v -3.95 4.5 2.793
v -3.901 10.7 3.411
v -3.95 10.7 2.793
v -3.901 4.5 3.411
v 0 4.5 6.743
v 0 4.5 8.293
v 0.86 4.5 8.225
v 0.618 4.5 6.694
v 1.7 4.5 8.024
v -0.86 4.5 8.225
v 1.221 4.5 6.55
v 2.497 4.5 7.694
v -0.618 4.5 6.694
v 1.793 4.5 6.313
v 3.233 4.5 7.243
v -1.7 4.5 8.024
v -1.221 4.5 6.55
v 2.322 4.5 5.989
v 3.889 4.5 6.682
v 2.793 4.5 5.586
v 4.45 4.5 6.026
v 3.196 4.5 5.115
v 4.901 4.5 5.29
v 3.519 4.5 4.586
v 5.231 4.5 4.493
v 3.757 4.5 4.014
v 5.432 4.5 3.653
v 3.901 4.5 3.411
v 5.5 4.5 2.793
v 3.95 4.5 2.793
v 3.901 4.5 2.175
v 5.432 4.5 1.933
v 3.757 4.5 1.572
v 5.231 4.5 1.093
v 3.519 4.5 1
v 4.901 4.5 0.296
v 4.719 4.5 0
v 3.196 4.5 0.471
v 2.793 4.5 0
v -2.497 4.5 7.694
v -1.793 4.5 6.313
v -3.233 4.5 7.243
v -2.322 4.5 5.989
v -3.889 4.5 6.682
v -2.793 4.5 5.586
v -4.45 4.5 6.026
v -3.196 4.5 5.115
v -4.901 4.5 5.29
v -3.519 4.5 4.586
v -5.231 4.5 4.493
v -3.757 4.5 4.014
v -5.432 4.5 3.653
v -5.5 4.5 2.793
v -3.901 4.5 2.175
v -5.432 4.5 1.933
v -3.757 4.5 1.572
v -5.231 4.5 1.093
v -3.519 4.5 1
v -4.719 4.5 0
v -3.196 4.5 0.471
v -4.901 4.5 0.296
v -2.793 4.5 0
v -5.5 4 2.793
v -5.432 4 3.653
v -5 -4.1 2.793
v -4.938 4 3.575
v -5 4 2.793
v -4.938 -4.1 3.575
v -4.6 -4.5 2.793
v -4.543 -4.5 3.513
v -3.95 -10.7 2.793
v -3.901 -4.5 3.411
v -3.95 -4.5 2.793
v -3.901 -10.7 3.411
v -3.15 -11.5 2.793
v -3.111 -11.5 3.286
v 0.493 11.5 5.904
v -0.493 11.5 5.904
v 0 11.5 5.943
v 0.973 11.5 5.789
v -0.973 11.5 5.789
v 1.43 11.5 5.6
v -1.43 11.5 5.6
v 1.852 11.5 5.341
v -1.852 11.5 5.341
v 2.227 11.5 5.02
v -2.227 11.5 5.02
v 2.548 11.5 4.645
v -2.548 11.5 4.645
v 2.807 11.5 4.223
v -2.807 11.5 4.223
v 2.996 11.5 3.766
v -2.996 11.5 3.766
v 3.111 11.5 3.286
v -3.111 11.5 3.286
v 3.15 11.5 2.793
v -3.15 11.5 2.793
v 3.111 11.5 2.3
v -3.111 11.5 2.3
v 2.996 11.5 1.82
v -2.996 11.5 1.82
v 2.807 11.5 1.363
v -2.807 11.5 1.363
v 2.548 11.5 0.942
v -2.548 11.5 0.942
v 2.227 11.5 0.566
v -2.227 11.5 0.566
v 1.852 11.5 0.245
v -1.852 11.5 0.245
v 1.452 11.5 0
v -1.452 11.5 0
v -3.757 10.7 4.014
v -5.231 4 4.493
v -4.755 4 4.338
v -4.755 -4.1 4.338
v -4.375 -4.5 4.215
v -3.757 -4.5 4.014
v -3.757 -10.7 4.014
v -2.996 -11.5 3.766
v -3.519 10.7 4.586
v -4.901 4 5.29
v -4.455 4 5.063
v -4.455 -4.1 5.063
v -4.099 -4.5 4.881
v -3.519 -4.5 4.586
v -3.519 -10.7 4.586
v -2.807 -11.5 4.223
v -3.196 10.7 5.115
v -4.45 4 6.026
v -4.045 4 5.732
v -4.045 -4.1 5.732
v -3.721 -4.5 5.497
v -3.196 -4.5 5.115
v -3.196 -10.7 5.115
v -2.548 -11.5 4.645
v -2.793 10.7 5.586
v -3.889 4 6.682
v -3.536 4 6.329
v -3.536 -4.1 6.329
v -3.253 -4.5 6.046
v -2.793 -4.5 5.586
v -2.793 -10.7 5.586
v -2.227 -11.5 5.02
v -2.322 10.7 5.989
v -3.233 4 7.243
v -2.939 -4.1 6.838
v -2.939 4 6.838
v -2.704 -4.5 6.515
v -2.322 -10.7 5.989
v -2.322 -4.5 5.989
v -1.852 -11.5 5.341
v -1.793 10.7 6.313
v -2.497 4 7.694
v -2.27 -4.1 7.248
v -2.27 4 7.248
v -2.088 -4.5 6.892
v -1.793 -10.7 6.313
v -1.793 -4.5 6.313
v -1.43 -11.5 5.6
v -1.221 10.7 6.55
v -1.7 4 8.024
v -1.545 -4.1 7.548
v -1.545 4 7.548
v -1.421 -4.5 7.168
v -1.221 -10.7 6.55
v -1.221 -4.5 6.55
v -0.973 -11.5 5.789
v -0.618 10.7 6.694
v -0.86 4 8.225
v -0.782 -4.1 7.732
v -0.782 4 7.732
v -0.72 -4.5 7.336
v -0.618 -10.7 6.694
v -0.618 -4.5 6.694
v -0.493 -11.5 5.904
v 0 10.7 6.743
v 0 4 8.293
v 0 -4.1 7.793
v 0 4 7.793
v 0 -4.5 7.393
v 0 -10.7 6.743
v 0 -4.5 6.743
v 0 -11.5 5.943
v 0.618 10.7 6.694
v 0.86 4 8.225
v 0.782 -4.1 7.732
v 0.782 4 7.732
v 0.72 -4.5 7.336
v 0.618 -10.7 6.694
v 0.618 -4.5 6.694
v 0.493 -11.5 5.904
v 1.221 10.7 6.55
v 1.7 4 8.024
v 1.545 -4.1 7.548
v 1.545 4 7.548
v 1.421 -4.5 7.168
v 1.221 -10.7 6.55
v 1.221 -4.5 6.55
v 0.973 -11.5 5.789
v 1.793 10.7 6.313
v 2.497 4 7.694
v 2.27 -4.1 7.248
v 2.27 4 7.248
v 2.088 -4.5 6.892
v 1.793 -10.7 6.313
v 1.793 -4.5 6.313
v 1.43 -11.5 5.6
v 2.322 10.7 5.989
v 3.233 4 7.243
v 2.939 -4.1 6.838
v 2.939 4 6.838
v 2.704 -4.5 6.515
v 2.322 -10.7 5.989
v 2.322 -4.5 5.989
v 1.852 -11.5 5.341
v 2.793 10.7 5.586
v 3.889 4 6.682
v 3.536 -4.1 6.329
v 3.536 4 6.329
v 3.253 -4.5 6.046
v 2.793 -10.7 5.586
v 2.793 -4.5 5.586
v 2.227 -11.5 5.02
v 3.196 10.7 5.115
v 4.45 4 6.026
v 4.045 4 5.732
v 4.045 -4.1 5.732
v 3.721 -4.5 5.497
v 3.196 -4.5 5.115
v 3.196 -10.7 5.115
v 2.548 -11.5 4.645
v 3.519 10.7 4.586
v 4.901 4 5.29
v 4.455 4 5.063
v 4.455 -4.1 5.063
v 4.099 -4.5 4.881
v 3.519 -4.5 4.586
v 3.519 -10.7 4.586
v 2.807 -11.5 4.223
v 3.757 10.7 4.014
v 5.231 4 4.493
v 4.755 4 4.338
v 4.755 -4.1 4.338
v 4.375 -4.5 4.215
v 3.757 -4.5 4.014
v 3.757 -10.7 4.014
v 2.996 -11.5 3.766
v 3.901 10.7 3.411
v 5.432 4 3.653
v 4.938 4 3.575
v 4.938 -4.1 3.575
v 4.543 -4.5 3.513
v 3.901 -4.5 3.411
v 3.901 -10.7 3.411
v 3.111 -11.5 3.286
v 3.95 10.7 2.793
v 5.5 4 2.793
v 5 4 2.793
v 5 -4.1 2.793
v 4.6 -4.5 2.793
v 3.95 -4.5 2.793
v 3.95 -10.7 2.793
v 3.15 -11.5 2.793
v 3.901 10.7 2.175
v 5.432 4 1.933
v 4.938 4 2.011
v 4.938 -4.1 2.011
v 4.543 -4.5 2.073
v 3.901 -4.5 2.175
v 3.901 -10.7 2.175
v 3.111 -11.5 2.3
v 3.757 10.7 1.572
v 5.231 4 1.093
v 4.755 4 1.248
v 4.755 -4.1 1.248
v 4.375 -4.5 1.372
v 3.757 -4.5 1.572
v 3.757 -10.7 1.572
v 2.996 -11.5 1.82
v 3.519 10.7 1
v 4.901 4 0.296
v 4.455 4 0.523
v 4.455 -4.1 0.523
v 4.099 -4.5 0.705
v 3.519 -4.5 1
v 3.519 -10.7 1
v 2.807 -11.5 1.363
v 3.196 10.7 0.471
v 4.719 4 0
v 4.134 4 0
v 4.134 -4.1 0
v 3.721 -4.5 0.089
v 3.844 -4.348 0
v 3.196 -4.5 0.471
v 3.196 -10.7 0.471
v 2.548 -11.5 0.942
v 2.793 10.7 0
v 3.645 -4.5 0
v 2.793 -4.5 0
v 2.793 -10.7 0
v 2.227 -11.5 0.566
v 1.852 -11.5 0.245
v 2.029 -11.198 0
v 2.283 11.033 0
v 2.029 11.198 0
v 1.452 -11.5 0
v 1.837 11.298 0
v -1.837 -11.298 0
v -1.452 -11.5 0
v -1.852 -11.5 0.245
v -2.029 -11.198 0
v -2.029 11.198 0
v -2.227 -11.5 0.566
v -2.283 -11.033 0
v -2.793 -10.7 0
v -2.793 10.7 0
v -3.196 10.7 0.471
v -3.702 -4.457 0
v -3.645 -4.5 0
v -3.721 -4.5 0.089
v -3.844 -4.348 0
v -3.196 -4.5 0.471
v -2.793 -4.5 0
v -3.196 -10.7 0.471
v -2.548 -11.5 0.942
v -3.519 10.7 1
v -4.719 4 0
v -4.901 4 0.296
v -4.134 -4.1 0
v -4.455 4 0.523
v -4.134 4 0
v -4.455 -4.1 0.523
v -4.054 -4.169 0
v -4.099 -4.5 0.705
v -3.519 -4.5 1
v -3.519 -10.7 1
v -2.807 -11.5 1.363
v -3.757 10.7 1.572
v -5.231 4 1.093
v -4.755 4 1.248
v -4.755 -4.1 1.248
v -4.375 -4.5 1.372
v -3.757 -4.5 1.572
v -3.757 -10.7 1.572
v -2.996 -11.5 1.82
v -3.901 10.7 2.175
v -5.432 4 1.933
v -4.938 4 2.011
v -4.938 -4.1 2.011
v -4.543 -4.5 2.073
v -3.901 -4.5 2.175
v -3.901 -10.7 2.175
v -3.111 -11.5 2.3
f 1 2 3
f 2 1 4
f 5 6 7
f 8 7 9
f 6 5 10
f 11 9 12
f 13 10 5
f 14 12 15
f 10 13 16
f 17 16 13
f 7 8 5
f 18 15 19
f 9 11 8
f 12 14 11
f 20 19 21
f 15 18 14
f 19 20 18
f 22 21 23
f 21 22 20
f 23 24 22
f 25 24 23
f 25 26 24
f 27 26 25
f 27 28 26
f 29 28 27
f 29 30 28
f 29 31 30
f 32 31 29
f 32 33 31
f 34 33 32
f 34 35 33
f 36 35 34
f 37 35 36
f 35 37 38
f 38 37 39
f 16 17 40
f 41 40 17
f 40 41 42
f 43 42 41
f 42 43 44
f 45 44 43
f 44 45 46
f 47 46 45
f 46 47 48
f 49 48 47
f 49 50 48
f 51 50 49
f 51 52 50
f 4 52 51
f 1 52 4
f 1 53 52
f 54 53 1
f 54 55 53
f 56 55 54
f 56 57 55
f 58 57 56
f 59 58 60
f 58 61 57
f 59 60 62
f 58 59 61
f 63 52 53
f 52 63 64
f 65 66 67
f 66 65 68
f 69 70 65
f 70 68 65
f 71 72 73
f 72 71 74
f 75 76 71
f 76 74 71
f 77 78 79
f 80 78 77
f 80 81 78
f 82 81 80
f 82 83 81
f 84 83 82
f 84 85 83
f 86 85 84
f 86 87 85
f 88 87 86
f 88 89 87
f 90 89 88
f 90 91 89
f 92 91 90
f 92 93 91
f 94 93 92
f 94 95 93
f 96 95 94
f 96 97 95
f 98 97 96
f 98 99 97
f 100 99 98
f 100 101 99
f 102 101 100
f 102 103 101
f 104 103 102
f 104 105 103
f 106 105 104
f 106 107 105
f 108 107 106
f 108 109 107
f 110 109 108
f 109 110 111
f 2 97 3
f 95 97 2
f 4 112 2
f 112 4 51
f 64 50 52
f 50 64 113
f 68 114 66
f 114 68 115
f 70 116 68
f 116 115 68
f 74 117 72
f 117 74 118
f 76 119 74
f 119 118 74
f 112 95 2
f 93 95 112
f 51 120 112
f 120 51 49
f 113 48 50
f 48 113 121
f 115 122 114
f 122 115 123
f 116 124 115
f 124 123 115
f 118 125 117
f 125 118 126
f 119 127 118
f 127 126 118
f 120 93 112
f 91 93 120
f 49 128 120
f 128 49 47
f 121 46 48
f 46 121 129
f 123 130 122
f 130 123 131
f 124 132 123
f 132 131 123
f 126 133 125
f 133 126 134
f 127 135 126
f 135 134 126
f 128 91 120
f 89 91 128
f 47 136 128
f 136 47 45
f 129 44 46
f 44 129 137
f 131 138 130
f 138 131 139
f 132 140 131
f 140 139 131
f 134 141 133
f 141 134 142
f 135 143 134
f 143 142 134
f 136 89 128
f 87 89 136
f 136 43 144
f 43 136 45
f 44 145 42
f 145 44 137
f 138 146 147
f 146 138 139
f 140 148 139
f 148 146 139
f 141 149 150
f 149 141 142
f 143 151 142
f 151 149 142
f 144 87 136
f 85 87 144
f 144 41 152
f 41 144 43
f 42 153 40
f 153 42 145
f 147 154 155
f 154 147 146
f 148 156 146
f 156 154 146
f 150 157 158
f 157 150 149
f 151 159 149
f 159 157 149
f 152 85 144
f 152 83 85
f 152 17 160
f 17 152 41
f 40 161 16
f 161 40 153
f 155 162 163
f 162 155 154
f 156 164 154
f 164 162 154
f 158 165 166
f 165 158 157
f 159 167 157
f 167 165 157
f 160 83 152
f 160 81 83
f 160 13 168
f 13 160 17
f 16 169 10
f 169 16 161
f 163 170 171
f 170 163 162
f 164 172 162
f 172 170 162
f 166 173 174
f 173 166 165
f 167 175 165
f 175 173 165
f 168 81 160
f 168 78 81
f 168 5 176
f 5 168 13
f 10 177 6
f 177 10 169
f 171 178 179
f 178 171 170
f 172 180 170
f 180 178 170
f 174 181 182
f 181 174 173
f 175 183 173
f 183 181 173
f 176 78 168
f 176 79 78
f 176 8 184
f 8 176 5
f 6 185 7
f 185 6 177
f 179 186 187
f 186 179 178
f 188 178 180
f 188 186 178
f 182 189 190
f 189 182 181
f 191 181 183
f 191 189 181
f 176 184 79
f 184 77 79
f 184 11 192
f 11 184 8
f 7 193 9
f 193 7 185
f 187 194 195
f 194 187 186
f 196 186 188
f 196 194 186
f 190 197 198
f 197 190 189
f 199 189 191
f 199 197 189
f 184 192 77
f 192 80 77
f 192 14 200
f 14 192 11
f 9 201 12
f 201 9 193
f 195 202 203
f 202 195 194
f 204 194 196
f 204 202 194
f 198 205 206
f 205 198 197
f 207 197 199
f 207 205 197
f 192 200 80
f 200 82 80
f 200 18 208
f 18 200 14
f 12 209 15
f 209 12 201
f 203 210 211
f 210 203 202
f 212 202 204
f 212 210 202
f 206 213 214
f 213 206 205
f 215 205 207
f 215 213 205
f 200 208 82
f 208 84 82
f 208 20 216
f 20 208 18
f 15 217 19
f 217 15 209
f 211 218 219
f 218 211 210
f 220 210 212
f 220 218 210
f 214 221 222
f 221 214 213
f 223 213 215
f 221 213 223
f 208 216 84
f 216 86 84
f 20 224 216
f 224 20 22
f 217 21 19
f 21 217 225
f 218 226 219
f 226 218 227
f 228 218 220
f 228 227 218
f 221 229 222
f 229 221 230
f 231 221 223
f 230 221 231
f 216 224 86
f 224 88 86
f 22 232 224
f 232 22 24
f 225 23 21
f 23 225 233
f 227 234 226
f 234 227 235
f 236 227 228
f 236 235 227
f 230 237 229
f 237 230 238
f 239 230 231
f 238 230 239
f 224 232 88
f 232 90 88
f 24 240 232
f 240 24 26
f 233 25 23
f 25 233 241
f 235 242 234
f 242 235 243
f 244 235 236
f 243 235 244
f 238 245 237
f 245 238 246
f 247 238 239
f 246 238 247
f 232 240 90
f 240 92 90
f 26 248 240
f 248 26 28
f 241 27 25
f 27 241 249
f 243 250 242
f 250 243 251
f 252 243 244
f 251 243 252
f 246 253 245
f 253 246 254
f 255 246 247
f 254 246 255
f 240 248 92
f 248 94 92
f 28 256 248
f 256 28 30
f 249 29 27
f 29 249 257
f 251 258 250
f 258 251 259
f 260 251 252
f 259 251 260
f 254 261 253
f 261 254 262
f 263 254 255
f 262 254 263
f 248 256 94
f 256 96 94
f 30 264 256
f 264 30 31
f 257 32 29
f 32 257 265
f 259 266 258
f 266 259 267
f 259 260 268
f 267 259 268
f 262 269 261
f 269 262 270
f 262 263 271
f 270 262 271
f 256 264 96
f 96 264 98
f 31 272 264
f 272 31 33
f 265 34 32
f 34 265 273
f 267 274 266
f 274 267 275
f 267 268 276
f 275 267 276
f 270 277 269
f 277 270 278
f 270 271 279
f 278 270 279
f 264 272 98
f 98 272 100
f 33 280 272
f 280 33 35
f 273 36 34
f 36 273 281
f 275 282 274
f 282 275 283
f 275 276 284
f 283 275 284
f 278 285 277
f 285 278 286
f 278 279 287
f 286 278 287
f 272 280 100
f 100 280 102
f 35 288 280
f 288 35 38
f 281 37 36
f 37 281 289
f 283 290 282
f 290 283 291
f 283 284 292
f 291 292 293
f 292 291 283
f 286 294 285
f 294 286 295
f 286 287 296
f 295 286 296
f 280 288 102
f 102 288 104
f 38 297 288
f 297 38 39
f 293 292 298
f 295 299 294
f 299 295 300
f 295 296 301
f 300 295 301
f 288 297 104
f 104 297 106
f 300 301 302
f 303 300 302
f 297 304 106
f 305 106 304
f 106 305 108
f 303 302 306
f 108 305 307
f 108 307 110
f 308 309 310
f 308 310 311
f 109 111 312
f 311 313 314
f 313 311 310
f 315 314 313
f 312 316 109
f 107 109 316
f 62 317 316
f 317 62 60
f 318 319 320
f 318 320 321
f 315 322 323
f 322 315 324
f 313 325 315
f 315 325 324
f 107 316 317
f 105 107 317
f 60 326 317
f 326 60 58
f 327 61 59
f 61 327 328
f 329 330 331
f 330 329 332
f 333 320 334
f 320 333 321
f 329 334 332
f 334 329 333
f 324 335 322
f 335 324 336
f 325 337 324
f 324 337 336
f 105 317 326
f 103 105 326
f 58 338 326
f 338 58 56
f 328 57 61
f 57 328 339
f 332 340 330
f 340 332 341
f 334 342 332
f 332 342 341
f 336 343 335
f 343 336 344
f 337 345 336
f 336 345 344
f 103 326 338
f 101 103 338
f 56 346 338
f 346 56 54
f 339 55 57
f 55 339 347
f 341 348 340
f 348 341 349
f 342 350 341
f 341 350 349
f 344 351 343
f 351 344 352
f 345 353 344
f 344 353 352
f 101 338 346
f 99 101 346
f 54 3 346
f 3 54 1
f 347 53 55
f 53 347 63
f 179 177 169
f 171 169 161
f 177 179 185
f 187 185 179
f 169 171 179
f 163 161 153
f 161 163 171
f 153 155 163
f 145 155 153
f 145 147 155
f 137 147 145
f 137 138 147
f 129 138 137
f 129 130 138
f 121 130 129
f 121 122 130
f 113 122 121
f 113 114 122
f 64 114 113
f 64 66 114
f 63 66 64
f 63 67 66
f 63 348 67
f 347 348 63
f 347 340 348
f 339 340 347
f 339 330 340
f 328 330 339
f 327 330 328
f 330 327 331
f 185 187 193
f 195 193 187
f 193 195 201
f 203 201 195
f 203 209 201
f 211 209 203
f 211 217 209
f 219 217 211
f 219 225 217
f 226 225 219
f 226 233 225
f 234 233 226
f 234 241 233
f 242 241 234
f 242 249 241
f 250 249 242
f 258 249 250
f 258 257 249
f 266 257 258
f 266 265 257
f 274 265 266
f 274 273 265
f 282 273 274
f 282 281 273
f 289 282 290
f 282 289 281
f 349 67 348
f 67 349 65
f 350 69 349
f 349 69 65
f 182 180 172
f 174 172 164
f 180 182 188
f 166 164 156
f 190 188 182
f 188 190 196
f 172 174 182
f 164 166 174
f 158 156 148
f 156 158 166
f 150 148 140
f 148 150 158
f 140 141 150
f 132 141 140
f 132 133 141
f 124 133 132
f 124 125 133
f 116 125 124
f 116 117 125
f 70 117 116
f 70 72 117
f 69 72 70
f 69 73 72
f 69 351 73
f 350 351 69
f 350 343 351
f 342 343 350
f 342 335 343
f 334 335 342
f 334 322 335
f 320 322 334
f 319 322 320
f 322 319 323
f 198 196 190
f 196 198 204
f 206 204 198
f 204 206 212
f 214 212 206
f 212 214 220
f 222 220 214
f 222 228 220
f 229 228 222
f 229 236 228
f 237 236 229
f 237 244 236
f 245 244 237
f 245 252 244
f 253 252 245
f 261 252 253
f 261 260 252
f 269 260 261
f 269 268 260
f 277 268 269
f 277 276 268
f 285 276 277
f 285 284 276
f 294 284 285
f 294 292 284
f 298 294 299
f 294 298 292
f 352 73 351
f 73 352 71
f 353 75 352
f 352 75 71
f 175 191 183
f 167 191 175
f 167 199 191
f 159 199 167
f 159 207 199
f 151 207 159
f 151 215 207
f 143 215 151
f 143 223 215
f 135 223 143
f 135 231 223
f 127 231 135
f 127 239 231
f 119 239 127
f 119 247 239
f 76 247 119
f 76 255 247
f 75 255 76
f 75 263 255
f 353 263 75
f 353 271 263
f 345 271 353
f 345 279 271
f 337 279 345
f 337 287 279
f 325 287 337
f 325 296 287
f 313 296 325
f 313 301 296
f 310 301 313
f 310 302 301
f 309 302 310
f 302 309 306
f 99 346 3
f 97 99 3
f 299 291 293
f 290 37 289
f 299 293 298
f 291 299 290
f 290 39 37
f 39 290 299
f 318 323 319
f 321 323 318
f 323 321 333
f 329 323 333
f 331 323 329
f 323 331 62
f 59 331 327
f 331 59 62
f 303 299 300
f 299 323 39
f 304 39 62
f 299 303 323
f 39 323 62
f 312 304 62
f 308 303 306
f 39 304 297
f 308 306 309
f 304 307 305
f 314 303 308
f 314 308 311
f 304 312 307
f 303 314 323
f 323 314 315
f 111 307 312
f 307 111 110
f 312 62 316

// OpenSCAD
include <../lib/filament-spool-roller-lib.scad>;
$fn = 40;
peg_inner();
